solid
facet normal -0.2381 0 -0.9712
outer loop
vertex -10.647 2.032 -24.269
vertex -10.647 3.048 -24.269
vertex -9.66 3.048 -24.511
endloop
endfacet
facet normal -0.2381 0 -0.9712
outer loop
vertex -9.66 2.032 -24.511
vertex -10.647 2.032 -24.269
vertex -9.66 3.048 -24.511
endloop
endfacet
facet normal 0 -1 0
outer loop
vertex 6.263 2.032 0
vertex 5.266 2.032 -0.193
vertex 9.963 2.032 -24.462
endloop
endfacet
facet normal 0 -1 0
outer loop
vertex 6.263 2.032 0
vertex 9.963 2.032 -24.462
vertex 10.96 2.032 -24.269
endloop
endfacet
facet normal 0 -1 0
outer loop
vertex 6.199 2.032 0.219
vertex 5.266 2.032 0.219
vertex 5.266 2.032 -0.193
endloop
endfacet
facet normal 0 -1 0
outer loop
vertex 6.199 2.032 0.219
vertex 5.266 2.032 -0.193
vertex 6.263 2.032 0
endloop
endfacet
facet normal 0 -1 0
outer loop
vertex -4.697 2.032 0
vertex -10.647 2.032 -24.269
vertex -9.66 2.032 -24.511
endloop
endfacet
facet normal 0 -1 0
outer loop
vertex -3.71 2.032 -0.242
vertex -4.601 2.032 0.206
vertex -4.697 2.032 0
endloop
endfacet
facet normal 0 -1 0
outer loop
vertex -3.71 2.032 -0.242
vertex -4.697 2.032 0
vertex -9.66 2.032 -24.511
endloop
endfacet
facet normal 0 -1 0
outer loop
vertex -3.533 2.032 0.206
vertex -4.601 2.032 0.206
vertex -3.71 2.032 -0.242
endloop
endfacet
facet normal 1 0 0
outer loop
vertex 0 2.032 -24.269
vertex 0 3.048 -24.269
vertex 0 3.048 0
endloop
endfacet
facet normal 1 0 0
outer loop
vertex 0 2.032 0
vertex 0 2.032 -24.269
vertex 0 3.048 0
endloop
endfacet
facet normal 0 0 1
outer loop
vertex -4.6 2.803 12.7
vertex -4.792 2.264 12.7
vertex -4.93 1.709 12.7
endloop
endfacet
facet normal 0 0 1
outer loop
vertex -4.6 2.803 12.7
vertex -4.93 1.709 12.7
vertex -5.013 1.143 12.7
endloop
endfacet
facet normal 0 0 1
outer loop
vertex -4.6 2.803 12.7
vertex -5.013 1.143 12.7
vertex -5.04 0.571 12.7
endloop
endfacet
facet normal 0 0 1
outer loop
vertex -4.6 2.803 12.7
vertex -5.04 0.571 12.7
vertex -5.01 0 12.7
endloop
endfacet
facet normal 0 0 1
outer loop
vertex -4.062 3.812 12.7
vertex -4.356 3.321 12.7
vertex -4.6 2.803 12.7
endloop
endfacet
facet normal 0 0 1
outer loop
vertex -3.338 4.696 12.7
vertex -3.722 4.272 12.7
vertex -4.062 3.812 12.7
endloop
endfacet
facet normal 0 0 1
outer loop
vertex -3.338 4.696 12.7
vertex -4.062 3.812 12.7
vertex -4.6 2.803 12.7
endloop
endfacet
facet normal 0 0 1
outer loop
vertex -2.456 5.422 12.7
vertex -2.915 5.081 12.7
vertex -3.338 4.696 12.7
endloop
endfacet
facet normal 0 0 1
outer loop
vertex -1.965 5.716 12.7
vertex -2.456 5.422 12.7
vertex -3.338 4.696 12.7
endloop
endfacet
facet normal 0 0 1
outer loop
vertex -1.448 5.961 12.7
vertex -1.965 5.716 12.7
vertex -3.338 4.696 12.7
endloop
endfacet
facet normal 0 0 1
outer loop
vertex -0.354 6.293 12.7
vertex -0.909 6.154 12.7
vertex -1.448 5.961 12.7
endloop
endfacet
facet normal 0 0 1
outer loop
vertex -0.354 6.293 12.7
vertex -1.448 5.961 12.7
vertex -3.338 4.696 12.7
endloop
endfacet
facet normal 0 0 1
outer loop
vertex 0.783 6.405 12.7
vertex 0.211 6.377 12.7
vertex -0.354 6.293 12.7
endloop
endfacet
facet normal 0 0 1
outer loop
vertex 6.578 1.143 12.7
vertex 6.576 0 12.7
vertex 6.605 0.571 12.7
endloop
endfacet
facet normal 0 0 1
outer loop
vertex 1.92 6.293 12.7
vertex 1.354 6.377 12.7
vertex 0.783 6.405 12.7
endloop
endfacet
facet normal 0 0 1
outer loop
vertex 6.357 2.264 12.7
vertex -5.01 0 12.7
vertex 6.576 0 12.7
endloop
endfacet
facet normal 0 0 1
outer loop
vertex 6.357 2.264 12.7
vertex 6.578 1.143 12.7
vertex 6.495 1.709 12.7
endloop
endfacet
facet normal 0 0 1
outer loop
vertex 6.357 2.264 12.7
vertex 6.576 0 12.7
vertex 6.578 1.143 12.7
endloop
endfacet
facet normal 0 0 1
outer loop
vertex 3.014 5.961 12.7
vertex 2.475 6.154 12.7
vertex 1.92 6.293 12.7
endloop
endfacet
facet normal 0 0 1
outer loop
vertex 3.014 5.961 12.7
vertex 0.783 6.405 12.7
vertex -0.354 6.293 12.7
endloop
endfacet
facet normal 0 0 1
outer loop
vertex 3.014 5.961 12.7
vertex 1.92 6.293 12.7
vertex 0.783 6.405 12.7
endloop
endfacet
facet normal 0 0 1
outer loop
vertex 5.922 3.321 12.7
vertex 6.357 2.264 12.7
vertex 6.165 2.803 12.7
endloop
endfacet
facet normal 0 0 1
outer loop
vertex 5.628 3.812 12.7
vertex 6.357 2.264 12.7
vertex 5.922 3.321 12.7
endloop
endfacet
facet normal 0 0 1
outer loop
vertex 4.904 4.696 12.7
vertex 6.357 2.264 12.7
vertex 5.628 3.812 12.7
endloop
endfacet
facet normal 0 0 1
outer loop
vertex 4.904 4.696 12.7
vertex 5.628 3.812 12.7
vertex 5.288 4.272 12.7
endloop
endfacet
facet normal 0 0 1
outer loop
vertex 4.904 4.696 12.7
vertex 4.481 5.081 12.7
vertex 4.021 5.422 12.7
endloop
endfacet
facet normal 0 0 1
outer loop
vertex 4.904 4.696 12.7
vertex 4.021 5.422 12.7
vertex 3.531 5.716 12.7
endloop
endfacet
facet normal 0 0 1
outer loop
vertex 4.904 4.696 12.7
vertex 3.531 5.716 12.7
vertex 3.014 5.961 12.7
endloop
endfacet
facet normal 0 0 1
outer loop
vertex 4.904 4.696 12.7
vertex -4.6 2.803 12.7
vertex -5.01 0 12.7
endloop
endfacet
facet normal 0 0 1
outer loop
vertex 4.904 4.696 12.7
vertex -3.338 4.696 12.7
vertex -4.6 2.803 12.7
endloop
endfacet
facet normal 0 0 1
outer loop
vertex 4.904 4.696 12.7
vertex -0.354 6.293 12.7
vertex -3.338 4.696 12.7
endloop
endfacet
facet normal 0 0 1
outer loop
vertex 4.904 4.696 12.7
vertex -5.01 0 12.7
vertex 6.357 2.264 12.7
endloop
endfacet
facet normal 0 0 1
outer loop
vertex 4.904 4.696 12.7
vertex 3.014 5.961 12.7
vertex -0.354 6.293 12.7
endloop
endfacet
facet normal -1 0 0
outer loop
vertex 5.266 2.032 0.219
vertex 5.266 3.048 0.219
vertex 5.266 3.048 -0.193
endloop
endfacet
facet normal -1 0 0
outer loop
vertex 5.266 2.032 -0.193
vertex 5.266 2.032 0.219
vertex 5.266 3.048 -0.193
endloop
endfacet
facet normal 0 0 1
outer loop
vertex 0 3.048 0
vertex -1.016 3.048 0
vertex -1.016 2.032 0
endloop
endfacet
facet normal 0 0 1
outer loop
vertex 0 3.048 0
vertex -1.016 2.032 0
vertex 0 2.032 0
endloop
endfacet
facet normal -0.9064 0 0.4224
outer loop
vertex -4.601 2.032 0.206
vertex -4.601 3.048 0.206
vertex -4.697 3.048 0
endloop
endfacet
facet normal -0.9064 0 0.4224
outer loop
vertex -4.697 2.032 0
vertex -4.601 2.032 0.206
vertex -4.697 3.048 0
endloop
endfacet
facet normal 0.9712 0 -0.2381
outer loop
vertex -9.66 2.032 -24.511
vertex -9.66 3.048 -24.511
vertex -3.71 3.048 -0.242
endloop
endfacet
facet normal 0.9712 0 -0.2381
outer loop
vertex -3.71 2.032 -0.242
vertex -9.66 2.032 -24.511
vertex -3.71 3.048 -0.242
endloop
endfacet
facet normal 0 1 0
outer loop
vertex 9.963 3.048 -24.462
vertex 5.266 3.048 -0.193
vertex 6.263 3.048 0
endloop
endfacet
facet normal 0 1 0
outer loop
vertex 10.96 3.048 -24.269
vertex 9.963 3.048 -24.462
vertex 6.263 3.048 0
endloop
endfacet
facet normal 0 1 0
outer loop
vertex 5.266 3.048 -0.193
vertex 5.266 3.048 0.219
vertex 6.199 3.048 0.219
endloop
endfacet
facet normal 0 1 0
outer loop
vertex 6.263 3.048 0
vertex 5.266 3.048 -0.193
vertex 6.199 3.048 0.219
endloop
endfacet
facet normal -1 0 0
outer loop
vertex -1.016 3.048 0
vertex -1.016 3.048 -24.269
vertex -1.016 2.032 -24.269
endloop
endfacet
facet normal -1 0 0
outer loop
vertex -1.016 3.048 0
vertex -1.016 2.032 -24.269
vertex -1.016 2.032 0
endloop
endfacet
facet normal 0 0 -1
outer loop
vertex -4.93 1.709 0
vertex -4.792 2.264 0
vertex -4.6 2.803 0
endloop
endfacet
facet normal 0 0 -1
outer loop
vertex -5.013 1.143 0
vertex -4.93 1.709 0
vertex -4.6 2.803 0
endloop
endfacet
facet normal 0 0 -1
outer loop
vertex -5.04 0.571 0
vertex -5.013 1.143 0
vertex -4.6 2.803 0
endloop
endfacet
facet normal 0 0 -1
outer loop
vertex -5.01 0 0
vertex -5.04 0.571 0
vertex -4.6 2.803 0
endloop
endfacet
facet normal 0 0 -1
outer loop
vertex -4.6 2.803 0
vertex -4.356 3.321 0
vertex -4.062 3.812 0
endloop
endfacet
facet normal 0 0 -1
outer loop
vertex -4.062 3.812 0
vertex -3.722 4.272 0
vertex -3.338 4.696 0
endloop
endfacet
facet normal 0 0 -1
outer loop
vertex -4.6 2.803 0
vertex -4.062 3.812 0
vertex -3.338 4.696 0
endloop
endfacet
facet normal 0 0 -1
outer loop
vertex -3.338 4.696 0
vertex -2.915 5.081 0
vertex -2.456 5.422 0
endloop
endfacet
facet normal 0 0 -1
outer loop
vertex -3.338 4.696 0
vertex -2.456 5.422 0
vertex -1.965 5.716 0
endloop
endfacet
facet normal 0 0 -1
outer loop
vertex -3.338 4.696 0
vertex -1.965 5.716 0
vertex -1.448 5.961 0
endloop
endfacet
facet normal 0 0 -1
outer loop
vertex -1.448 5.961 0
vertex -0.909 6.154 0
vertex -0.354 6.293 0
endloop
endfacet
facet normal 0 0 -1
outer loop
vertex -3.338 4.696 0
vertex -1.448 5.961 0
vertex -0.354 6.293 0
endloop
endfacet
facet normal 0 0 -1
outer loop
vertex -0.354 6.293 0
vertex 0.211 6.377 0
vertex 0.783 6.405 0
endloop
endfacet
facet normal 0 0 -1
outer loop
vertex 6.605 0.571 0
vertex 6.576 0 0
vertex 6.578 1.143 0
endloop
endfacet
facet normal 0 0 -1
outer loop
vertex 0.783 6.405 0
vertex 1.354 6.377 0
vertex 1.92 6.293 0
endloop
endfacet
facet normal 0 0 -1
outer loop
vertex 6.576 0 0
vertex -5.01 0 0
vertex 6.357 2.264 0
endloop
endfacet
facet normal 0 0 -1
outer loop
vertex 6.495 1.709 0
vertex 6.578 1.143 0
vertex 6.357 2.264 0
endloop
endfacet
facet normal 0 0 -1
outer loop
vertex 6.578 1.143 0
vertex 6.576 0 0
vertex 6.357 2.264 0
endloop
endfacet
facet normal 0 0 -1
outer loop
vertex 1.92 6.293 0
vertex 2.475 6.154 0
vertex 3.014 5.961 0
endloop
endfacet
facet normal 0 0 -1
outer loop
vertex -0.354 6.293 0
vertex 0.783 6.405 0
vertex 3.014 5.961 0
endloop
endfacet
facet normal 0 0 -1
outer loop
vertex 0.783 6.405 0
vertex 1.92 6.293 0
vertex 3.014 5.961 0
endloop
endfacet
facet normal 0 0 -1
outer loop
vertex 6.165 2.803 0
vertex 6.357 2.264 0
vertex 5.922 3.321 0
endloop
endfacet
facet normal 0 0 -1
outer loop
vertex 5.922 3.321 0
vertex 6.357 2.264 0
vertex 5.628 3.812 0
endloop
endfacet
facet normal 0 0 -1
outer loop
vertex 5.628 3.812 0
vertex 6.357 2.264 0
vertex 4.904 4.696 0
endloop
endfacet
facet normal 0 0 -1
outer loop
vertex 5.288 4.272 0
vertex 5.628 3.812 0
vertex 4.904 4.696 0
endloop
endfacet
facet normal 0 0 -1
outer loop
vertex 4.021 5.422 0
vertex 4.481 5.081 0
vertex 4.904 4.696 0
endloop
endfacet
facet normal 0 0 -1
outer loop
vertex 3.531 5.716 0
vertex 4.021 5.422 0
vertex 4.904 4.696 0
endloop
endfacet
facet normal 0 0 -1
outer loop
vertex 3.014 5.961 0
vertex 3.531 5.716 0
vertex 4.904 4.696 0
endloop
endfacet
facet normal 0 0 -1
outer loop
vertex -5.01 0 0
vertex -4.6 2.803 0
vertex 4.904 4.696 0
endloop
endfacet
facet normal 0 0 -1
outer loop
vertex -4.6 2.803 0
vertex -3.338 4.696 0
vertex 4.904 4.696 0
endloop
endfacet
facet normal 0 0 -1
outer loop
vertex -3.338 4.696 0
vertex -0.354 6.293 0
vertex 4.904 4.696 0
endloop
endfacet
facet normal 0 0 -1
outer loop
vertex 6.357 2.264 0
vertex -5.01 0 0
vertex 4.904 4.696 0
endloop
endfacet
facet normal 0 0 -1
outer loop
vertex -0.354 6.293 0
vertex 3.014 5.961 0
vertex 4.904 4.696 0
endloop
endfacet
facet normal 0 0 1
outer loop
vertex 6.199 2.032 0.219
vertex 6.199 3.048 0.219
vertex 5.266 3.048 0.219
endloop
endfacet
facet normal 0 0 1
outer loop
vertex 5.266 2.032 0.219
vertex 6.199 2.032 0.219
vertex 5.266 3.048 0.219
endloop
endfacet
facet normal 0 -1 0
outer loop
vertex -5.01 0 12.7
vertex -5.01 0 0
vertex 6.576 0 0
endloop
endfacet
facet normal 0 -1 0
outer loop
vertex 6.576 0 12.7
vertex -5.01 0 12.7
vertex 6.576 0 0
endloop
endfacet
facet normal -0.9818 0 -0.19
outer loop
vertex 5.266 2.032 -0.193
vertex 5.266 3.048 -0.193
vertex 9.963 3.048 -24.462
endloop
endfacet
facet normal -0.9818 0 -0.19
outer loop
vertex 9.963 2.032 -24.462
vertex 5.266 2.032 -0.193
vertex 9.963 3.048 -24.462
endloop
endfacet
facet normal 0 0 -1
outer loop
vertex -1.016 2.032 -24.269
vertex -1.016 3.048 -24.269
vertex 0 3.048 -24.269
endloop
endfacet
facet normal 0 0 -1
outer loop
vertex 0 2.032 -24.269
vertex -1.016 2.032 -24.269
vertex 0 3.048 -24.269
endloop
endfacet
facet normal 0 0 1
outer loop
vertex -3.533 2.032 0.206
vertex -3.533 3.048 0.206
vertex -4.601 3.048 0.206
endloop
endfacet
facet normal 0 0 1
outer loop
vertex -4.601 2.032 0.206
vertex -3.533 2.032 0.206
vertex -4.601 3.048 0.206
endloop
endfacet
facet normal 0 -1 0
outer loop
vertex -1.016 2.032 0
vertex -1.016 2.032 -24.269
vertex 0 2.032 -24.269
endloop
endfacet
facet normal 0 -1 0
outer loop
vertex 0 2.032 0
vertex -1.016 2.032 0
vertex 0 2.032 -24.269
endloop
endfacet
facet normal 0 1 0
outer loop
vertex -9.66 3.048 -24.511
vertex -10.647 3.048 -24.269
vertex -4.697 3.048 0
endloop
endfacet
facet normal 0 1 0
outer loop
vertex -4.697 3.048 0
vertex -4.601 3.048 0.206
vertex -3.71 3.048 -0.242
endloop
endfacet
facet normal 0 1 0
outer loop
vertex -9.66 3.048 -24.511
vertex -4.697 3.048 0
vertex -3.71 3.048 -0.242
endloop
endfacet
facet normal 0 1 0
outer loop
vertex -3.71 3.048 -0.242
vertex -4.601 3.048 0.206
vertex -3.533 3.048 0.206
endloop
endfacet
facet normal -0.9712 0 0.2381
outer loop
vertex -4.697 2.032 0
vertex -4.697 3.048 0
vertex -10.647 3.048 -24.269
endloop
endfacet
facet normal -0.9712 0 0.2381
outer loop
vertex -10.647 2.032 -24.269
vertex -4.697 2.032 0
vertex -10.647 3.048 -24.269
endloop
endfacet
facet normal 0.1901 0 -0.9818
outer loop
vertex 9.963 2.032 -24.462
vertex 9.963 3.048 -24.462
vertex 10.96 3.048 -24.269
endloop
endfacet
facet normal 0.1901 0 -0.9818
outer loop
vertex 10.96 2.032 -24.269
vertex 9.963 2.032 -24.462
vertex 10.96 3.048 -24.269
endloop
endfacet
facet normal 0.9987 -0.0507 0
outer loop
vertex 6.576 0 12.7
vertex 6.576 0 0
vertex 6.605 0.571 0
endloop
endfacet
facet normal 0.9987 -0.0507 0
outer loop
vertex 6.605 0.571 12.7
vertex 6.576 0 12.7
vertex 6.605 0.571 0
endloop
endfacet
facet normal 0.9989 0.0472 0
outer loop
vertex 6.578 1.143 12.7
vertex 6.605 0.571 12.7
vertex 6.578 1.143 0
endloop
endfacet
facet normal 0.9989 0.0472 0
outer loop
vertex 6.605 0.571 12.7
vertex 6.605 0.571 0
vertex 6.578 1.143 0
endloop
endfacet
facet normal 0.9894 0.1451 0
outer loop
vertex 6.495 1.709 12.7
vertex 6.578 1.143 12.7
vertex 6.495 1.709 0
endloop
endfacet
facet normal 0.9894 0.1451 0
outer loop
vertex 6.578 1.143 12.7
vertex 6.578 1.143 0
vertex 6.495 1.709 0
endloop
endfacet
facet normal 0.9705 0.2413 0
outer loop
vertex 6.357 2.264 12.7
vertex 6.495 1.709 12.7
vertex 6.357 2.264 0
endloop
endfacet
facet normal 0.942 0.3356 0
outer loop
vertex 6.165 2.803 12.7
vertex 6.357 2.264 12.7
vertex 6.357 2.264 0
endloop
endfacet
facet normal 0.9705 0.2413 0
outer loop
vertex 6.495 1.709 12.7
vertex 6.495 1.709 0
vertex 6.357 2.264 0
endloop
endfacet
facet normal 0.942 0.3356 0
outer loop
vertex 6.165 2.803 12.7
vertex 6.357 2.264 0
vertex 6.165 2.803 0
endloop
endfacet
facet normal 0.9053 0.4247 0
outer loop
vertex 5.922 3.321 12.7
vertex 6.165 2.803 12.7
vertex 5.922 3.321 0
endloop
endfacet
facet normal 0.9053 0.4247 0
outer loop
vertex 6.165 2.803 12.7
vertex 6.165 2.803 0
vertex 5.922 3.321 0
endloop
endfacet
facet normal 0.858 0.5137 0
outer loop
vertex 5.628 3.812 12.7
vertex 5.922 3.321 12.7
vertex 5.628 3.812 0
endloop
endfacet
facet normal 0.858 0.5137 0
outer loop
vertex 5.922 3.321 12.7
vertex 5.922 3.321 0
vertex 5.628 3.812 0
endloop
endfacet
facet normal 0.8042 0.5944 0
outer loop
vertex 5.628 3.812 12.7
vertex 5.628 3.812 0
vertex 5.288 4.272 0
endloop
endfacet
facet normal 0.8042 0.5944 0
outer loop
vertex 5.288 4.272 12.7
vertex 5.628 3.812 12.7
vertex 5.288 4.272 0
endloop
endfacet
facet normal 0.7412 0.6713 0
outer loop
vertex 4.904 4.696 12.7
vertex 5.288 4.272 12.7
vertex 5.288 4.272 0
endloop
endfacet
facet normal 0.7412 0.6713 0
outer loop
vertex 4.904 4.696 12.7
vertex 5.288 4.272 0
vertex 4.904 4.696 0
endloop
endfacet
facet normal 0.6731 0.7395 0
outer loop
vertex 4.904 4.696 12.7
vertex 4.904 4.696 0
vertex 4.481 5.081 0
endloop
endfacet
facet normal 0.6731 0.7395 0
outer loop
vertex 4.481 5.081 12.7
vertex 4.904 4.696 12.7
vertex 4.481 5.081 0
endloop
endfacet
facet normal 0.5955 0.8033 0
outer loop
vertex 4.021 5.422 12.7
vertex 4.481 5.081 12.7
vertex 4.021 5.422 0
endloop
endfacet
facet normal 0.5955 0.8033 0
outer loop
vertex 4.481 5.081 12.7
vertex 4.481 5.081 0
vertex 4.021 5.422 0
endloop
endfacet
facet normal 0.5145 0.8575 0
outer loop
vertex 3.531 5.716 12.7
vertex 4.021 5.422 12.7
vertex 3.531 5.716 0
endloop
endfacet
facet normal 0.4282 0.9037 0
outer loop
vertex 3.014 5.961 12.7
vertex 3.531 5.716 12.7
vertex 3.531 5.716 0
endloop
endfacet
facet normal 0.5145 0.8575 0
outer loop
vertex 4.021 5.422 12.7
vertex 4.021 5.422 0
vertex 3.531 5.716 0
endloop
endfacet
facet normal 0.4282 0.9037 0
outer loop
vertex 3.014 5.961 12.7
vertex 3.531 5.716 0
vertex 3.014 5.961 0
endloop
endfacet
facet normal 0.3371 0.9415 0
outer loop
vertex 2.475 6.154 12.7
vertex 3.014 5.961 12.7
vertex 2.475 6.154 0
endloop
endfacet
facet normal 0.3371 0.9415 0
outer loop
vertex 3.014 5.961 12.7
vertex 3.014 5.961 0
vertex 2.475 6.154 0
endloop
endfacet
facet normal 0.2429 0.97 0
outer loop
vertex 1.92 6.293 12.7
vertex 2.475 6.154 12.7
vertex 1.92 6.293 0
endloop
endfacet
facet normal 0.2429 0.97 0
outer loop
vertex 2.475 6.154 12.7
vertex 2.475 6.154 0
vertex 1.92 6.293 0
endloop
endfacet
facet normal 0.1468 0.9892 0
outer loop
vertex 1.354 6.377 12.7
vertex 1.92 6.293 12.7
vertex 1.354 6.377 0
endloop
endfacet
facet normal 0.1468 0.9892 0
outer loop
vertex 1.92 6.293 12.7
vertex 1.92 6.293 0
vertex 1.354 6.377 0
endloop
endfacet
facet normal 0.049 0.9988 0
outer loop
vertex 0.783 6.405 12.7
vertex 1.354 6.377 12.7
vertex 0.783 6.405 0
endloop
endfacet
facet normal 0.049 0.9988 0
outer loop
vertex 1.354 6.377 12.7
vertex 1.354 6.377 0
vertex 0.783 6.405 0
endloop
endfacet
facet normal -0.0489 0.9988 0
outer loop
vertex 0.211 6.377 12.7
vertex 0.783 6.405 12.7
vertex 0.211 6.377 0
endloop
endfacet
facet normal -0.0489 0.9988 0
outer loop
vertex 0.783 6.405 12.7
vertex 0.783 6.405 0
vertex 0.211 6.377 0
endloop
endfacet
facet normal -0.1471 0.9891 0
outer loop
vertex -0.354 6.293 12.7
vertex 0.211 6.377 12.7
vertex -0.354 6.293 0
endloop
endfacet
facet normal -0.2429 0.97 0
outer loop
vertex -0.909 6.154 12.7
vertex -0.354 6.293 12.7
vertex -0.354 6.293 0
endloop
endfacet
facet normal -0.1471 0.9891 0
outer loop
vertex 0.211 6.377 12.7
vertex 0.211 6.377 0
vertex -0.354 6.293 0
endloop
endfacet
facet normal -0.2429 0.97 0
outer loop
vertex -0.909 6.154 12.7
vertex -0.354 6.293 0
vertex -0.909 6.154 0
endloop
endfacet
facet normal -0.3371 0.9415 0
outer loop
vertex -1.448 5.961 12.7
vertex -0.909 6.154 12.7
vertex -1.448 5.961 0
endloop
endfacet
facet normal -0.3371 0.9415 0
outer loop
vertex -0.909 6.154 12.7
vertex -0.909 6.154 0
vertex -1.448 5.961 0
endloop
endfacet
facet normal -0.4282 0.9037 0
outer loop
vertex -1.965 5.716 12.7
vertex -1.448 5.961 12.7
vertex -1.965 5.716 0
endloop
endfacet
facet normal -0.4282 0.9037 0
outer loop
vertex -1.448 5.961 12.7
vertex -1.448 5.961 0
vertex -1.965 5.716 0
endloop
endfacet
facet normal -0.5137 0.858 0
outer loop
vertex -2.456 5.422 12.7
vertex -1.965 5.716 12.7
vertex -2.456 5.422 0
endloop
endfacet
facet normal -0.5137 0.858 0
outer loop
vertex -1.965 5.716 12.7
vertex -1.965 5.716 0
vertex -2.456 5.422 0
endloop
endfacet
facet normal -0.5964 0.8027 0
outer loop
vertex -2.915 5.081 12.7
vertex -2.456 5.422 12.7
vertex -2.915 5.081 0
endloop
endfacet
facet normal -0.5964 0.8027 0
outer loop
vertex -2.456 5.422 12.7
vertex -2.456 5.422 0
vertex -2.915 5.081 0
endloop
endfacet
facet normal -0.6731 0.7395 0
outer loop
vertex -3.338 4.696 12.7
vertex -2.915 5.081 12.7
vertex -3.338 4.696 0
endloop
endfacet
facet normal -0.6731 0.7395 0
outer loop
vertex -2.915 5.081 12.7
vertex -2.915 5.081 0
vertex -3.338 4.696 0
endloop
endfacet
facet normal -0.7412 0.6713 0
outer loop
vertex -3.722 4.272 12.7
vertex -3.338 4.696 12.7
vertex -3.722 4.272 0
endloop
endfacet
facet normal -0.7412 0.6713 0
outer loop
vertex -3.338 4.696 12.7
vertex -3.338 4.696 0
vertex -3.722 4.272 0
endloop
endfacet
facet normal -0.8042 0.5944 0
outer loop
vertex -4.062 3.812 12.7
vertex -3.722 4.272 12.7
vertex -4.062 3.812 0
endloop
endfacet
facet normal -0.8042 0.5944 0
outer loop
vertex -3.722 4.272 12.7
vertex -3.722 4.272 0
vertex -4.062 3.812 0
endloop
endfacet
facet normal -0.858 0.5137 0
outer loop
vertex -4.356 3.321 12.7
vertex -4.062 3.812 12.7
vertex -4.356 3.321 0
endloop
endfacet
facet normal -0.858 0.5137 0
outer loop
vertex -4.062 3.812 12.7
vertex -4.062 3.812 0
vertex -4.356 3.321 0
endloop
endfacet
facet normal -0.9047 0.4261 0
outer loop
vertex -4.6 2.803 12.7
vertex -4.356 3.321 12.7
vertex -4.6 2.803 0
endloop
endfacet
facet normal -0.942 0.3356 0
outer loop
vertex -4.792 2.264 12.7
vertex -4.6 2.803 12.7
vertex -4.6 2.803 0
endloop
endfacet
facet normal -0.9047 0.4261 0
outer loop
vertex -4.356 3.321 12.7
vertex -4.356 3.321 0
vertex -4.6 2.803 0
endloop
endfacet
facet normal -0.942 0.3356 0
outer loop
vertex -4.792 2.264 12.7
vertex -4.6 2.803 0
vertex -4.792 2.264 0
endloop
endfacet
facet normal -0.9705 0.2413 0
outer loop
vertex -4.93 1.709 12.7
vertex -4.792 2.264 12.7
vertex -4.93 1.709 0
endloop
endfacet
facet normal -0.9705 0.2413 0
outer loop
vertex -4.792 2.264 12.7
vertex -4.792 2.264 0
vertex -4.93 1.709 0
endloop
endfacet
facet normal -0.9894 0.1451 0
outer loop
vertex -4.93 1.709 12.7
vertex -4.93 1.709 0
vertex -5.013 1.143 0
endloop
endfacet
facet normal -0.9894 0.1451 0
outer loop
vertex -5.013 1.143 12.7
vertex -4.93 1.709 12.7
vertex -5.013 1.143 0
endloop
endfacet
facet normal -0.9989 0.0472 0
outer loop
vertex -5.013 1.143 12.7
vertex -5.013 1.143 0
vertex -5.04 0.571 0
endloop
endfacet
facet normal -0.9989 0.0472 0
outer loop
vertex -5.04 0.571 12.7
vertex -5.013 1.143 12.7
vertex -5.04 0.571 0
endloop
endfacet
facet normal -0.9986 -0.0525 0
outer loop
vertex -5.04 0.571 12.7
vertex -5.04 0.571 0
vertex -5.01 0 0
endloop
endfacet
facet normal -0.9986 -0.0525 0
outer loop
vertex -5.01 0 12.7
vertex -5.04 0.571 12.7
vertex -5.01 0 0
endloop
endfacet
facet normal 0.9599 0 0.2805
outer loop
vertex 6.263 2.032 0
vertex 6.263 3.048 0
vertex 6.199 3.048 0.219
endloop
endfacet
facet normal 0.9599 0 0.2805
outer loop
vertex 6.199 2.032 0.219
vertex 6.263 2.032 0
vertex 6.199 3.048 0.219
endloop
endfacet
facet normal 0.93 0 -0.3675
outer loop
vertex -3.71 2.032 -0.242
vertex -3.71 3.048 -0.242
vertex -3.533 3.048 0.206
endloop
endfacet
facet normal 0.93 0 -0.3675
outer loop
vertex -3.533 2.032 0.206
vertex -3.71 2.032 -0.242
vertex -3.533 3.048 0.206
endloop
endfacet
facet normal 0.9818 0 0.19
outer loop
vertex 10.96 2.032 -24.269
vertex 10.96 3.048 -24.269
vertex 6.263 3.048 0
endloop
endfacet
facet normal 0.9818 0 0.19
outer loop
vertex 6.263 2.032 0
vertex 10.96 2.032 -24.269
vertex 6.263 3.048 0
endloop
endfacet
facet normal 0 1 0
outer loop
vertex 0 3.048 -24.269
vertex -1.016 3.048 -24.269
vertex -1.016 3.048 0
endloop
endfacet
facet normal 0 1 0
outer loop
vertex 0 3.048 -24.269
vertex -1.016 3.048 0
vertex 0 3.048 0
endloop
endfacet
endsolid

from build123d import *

# Parameters (mm, degrees)
F1_DEPTH = 12.7
F3_W     = 1.016
F3_H     = 24.269179
F4_DEPTH = 1.016


with BuildPart() as f1:
    # F0 (on Top) → F1 (new body)
    with BuildSketch(Plane.XY):
        with BuildLine():
            Line((-5.010411, 0), (6.576165, 0))
            ThreePointArc((6.576165, 0), (0.782877, 6.405338), (-5.010411, 0))
        make_face()
    extrude(amount=F1_DEPTH)


with BuildPart() as f4:
    # F3 (on offset) → F4 (new body)
    with BuildSketch(Plane.XZ.offset(-3.048)):
        Polygon((10.960273, -24.269179), (6.263014, 0), (6.199471, 0.219361), (5.265526, 0.219361), (5.265526, -0.193062), (9.962785, -24.462241), align=None)
        with Locations((-0.508, -12.134589)):
            Rectangle(F3_W, F3_H)
        Polygon((-4.601094, 0.205852), (-4.697257, 0), (-10.647126, -24.269179), (-9.660348, -24.511098), (-3.710479, -0.24192), (-3.532893, 0.205852), align=None)
    extrude(amount=F4_DEPTH)


solid = Compound([f1.part, f4.part])
